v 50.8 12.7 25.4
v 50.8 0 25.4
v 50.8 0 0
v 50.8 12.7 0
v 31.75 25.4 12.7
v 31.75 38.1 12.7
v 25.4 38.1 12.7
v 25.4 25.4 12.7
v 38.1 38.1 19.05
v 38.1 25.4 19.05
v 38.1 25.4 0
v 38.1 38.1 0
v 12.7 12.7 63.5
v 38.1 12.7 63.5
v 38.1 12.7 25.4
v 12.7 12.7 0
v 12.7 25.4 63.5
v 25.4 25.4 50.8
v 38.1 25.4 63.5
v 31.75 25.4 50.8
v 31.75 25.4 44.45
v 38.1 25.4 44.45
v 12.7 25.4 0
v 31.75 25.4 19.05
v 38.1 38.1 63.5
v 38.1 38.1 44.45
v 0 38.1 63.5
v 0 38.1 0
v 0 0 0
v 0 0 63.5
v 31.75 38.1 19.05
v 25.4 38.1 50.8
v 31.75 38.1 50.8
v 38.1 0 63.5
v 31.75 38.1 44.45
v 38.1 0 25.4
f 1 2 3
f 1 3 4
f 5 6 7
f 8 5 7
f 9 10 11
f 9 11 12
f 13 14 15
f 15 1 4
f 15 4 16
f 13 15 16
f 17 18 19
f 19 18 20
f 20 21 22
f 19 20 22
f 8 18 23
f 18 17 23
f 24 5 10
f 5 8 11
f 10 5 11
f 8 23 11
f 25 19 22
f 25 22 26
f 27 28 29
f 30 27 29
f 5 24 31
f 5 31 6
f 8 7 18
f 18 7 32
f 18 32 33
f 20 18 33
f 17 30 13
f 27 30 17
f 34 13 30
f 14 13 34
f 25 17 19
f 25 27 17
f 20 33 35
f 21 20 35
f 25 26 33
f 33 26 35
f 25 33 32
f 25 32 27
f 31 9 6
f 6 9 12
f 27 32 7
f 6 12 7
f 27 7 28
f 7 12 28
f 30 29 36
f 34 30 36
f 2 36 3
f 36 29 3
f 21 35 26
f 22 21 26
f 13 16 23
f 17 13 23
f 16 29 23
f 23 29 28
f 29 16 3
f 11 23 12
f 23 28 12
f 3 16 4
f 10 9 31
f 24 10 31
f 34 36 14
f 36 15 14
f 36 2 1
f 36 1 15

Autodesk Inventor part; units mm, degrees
ref_plane "YZ Plane" through (0, 0, 0) normal (1, 0, 0) x (0, 1, 0)
ref_plane "XZ Plane" through (0, 0, 0) normal (0, 1, 0) x (-1, 0, 0)
ref_plane "XY Plane" through (0, 0, 0) normal (0, 0, 1) x (1, 0, 0)
sketch "Sketch1" plane through (0, 0, 0) normal (0, 0, 1) x (1, 0, 0)
  point P0 (0, 0)
sketch "Sketch2" plane through (0, 0, 0) normal (0, 0, 1) x (1, 0, 0)
  line L0 (0, 0) -> (50.8, 0)
  line L1 (50.8, 0) -> (50.8, 12.7)
  line L2 (50.8, 12.7) -> (12.7, 12.7)
  line L3 (12.7, 12.7) -> (12.7, 25.4)
  line L4 (12.7, 25.4) -> (38.1, 25.4)
  line L5 (38.1, 25.4) -> (38.1, 38.1)
  line L6 (38.1, 38.1) -> (0, 38.1)
  line L7 (0, 38.1) -> (0, 0)
extrude "Extrusion1" add sketch "Sketch2" along normal blind 63.5
sketch "Sketch3" plane through (12.7, 12.7, 0) normal (0, 1, 0) x (1, 0, 0)
  line L0 (38.1, -25.4) -> (25.4, -25.4)
  line L1 (25.4, -25.4) -> (25.4, -63.5)
  line L2 (38.1, -63.5) -> (0, -63.5) projected
  line L3 (25.4, -63.5) -> (38.1, -63.5)
  line L4 (38.1, -63.5) -> (38.1, -25.4)
  point P0 (-12.7, 0)
extrude "Extrusion2" cut sketch "Sketch3" against normal blind 12.7
sketch "Sketch4" plane through (0, 38.1, 0) normal (0, 1, 0) x (1, 0, 0)
  line L0 (38.1, 0) -> (38.1, -63.5) projected
  line L1 (38.1, -19.05) -> (31.75, -19.05)
  line L2 (31.75, -19.05) -> (31.75, -12.7)
  line L3 (31.75, -12.7) -> (25.4, -12.7)
  line L4 (25.4, -12.7) -> (25.4, -50.8)
  line L5 (25.4, -50.8) -> (31.75, -50.8)
  line L6 (31.75, -50.8) -> (31.75, -44.45)
  line L7 (31.75, -44.45) -> (38.1, -44.45)
  line L8 (38.1, -44.45) -> (38.1, -19.05)
  point P0 (0, 0)
extrude "Extrusion3" cut sketch "Sketch4" against normal blind 12.7
properties part number "P3-7"
